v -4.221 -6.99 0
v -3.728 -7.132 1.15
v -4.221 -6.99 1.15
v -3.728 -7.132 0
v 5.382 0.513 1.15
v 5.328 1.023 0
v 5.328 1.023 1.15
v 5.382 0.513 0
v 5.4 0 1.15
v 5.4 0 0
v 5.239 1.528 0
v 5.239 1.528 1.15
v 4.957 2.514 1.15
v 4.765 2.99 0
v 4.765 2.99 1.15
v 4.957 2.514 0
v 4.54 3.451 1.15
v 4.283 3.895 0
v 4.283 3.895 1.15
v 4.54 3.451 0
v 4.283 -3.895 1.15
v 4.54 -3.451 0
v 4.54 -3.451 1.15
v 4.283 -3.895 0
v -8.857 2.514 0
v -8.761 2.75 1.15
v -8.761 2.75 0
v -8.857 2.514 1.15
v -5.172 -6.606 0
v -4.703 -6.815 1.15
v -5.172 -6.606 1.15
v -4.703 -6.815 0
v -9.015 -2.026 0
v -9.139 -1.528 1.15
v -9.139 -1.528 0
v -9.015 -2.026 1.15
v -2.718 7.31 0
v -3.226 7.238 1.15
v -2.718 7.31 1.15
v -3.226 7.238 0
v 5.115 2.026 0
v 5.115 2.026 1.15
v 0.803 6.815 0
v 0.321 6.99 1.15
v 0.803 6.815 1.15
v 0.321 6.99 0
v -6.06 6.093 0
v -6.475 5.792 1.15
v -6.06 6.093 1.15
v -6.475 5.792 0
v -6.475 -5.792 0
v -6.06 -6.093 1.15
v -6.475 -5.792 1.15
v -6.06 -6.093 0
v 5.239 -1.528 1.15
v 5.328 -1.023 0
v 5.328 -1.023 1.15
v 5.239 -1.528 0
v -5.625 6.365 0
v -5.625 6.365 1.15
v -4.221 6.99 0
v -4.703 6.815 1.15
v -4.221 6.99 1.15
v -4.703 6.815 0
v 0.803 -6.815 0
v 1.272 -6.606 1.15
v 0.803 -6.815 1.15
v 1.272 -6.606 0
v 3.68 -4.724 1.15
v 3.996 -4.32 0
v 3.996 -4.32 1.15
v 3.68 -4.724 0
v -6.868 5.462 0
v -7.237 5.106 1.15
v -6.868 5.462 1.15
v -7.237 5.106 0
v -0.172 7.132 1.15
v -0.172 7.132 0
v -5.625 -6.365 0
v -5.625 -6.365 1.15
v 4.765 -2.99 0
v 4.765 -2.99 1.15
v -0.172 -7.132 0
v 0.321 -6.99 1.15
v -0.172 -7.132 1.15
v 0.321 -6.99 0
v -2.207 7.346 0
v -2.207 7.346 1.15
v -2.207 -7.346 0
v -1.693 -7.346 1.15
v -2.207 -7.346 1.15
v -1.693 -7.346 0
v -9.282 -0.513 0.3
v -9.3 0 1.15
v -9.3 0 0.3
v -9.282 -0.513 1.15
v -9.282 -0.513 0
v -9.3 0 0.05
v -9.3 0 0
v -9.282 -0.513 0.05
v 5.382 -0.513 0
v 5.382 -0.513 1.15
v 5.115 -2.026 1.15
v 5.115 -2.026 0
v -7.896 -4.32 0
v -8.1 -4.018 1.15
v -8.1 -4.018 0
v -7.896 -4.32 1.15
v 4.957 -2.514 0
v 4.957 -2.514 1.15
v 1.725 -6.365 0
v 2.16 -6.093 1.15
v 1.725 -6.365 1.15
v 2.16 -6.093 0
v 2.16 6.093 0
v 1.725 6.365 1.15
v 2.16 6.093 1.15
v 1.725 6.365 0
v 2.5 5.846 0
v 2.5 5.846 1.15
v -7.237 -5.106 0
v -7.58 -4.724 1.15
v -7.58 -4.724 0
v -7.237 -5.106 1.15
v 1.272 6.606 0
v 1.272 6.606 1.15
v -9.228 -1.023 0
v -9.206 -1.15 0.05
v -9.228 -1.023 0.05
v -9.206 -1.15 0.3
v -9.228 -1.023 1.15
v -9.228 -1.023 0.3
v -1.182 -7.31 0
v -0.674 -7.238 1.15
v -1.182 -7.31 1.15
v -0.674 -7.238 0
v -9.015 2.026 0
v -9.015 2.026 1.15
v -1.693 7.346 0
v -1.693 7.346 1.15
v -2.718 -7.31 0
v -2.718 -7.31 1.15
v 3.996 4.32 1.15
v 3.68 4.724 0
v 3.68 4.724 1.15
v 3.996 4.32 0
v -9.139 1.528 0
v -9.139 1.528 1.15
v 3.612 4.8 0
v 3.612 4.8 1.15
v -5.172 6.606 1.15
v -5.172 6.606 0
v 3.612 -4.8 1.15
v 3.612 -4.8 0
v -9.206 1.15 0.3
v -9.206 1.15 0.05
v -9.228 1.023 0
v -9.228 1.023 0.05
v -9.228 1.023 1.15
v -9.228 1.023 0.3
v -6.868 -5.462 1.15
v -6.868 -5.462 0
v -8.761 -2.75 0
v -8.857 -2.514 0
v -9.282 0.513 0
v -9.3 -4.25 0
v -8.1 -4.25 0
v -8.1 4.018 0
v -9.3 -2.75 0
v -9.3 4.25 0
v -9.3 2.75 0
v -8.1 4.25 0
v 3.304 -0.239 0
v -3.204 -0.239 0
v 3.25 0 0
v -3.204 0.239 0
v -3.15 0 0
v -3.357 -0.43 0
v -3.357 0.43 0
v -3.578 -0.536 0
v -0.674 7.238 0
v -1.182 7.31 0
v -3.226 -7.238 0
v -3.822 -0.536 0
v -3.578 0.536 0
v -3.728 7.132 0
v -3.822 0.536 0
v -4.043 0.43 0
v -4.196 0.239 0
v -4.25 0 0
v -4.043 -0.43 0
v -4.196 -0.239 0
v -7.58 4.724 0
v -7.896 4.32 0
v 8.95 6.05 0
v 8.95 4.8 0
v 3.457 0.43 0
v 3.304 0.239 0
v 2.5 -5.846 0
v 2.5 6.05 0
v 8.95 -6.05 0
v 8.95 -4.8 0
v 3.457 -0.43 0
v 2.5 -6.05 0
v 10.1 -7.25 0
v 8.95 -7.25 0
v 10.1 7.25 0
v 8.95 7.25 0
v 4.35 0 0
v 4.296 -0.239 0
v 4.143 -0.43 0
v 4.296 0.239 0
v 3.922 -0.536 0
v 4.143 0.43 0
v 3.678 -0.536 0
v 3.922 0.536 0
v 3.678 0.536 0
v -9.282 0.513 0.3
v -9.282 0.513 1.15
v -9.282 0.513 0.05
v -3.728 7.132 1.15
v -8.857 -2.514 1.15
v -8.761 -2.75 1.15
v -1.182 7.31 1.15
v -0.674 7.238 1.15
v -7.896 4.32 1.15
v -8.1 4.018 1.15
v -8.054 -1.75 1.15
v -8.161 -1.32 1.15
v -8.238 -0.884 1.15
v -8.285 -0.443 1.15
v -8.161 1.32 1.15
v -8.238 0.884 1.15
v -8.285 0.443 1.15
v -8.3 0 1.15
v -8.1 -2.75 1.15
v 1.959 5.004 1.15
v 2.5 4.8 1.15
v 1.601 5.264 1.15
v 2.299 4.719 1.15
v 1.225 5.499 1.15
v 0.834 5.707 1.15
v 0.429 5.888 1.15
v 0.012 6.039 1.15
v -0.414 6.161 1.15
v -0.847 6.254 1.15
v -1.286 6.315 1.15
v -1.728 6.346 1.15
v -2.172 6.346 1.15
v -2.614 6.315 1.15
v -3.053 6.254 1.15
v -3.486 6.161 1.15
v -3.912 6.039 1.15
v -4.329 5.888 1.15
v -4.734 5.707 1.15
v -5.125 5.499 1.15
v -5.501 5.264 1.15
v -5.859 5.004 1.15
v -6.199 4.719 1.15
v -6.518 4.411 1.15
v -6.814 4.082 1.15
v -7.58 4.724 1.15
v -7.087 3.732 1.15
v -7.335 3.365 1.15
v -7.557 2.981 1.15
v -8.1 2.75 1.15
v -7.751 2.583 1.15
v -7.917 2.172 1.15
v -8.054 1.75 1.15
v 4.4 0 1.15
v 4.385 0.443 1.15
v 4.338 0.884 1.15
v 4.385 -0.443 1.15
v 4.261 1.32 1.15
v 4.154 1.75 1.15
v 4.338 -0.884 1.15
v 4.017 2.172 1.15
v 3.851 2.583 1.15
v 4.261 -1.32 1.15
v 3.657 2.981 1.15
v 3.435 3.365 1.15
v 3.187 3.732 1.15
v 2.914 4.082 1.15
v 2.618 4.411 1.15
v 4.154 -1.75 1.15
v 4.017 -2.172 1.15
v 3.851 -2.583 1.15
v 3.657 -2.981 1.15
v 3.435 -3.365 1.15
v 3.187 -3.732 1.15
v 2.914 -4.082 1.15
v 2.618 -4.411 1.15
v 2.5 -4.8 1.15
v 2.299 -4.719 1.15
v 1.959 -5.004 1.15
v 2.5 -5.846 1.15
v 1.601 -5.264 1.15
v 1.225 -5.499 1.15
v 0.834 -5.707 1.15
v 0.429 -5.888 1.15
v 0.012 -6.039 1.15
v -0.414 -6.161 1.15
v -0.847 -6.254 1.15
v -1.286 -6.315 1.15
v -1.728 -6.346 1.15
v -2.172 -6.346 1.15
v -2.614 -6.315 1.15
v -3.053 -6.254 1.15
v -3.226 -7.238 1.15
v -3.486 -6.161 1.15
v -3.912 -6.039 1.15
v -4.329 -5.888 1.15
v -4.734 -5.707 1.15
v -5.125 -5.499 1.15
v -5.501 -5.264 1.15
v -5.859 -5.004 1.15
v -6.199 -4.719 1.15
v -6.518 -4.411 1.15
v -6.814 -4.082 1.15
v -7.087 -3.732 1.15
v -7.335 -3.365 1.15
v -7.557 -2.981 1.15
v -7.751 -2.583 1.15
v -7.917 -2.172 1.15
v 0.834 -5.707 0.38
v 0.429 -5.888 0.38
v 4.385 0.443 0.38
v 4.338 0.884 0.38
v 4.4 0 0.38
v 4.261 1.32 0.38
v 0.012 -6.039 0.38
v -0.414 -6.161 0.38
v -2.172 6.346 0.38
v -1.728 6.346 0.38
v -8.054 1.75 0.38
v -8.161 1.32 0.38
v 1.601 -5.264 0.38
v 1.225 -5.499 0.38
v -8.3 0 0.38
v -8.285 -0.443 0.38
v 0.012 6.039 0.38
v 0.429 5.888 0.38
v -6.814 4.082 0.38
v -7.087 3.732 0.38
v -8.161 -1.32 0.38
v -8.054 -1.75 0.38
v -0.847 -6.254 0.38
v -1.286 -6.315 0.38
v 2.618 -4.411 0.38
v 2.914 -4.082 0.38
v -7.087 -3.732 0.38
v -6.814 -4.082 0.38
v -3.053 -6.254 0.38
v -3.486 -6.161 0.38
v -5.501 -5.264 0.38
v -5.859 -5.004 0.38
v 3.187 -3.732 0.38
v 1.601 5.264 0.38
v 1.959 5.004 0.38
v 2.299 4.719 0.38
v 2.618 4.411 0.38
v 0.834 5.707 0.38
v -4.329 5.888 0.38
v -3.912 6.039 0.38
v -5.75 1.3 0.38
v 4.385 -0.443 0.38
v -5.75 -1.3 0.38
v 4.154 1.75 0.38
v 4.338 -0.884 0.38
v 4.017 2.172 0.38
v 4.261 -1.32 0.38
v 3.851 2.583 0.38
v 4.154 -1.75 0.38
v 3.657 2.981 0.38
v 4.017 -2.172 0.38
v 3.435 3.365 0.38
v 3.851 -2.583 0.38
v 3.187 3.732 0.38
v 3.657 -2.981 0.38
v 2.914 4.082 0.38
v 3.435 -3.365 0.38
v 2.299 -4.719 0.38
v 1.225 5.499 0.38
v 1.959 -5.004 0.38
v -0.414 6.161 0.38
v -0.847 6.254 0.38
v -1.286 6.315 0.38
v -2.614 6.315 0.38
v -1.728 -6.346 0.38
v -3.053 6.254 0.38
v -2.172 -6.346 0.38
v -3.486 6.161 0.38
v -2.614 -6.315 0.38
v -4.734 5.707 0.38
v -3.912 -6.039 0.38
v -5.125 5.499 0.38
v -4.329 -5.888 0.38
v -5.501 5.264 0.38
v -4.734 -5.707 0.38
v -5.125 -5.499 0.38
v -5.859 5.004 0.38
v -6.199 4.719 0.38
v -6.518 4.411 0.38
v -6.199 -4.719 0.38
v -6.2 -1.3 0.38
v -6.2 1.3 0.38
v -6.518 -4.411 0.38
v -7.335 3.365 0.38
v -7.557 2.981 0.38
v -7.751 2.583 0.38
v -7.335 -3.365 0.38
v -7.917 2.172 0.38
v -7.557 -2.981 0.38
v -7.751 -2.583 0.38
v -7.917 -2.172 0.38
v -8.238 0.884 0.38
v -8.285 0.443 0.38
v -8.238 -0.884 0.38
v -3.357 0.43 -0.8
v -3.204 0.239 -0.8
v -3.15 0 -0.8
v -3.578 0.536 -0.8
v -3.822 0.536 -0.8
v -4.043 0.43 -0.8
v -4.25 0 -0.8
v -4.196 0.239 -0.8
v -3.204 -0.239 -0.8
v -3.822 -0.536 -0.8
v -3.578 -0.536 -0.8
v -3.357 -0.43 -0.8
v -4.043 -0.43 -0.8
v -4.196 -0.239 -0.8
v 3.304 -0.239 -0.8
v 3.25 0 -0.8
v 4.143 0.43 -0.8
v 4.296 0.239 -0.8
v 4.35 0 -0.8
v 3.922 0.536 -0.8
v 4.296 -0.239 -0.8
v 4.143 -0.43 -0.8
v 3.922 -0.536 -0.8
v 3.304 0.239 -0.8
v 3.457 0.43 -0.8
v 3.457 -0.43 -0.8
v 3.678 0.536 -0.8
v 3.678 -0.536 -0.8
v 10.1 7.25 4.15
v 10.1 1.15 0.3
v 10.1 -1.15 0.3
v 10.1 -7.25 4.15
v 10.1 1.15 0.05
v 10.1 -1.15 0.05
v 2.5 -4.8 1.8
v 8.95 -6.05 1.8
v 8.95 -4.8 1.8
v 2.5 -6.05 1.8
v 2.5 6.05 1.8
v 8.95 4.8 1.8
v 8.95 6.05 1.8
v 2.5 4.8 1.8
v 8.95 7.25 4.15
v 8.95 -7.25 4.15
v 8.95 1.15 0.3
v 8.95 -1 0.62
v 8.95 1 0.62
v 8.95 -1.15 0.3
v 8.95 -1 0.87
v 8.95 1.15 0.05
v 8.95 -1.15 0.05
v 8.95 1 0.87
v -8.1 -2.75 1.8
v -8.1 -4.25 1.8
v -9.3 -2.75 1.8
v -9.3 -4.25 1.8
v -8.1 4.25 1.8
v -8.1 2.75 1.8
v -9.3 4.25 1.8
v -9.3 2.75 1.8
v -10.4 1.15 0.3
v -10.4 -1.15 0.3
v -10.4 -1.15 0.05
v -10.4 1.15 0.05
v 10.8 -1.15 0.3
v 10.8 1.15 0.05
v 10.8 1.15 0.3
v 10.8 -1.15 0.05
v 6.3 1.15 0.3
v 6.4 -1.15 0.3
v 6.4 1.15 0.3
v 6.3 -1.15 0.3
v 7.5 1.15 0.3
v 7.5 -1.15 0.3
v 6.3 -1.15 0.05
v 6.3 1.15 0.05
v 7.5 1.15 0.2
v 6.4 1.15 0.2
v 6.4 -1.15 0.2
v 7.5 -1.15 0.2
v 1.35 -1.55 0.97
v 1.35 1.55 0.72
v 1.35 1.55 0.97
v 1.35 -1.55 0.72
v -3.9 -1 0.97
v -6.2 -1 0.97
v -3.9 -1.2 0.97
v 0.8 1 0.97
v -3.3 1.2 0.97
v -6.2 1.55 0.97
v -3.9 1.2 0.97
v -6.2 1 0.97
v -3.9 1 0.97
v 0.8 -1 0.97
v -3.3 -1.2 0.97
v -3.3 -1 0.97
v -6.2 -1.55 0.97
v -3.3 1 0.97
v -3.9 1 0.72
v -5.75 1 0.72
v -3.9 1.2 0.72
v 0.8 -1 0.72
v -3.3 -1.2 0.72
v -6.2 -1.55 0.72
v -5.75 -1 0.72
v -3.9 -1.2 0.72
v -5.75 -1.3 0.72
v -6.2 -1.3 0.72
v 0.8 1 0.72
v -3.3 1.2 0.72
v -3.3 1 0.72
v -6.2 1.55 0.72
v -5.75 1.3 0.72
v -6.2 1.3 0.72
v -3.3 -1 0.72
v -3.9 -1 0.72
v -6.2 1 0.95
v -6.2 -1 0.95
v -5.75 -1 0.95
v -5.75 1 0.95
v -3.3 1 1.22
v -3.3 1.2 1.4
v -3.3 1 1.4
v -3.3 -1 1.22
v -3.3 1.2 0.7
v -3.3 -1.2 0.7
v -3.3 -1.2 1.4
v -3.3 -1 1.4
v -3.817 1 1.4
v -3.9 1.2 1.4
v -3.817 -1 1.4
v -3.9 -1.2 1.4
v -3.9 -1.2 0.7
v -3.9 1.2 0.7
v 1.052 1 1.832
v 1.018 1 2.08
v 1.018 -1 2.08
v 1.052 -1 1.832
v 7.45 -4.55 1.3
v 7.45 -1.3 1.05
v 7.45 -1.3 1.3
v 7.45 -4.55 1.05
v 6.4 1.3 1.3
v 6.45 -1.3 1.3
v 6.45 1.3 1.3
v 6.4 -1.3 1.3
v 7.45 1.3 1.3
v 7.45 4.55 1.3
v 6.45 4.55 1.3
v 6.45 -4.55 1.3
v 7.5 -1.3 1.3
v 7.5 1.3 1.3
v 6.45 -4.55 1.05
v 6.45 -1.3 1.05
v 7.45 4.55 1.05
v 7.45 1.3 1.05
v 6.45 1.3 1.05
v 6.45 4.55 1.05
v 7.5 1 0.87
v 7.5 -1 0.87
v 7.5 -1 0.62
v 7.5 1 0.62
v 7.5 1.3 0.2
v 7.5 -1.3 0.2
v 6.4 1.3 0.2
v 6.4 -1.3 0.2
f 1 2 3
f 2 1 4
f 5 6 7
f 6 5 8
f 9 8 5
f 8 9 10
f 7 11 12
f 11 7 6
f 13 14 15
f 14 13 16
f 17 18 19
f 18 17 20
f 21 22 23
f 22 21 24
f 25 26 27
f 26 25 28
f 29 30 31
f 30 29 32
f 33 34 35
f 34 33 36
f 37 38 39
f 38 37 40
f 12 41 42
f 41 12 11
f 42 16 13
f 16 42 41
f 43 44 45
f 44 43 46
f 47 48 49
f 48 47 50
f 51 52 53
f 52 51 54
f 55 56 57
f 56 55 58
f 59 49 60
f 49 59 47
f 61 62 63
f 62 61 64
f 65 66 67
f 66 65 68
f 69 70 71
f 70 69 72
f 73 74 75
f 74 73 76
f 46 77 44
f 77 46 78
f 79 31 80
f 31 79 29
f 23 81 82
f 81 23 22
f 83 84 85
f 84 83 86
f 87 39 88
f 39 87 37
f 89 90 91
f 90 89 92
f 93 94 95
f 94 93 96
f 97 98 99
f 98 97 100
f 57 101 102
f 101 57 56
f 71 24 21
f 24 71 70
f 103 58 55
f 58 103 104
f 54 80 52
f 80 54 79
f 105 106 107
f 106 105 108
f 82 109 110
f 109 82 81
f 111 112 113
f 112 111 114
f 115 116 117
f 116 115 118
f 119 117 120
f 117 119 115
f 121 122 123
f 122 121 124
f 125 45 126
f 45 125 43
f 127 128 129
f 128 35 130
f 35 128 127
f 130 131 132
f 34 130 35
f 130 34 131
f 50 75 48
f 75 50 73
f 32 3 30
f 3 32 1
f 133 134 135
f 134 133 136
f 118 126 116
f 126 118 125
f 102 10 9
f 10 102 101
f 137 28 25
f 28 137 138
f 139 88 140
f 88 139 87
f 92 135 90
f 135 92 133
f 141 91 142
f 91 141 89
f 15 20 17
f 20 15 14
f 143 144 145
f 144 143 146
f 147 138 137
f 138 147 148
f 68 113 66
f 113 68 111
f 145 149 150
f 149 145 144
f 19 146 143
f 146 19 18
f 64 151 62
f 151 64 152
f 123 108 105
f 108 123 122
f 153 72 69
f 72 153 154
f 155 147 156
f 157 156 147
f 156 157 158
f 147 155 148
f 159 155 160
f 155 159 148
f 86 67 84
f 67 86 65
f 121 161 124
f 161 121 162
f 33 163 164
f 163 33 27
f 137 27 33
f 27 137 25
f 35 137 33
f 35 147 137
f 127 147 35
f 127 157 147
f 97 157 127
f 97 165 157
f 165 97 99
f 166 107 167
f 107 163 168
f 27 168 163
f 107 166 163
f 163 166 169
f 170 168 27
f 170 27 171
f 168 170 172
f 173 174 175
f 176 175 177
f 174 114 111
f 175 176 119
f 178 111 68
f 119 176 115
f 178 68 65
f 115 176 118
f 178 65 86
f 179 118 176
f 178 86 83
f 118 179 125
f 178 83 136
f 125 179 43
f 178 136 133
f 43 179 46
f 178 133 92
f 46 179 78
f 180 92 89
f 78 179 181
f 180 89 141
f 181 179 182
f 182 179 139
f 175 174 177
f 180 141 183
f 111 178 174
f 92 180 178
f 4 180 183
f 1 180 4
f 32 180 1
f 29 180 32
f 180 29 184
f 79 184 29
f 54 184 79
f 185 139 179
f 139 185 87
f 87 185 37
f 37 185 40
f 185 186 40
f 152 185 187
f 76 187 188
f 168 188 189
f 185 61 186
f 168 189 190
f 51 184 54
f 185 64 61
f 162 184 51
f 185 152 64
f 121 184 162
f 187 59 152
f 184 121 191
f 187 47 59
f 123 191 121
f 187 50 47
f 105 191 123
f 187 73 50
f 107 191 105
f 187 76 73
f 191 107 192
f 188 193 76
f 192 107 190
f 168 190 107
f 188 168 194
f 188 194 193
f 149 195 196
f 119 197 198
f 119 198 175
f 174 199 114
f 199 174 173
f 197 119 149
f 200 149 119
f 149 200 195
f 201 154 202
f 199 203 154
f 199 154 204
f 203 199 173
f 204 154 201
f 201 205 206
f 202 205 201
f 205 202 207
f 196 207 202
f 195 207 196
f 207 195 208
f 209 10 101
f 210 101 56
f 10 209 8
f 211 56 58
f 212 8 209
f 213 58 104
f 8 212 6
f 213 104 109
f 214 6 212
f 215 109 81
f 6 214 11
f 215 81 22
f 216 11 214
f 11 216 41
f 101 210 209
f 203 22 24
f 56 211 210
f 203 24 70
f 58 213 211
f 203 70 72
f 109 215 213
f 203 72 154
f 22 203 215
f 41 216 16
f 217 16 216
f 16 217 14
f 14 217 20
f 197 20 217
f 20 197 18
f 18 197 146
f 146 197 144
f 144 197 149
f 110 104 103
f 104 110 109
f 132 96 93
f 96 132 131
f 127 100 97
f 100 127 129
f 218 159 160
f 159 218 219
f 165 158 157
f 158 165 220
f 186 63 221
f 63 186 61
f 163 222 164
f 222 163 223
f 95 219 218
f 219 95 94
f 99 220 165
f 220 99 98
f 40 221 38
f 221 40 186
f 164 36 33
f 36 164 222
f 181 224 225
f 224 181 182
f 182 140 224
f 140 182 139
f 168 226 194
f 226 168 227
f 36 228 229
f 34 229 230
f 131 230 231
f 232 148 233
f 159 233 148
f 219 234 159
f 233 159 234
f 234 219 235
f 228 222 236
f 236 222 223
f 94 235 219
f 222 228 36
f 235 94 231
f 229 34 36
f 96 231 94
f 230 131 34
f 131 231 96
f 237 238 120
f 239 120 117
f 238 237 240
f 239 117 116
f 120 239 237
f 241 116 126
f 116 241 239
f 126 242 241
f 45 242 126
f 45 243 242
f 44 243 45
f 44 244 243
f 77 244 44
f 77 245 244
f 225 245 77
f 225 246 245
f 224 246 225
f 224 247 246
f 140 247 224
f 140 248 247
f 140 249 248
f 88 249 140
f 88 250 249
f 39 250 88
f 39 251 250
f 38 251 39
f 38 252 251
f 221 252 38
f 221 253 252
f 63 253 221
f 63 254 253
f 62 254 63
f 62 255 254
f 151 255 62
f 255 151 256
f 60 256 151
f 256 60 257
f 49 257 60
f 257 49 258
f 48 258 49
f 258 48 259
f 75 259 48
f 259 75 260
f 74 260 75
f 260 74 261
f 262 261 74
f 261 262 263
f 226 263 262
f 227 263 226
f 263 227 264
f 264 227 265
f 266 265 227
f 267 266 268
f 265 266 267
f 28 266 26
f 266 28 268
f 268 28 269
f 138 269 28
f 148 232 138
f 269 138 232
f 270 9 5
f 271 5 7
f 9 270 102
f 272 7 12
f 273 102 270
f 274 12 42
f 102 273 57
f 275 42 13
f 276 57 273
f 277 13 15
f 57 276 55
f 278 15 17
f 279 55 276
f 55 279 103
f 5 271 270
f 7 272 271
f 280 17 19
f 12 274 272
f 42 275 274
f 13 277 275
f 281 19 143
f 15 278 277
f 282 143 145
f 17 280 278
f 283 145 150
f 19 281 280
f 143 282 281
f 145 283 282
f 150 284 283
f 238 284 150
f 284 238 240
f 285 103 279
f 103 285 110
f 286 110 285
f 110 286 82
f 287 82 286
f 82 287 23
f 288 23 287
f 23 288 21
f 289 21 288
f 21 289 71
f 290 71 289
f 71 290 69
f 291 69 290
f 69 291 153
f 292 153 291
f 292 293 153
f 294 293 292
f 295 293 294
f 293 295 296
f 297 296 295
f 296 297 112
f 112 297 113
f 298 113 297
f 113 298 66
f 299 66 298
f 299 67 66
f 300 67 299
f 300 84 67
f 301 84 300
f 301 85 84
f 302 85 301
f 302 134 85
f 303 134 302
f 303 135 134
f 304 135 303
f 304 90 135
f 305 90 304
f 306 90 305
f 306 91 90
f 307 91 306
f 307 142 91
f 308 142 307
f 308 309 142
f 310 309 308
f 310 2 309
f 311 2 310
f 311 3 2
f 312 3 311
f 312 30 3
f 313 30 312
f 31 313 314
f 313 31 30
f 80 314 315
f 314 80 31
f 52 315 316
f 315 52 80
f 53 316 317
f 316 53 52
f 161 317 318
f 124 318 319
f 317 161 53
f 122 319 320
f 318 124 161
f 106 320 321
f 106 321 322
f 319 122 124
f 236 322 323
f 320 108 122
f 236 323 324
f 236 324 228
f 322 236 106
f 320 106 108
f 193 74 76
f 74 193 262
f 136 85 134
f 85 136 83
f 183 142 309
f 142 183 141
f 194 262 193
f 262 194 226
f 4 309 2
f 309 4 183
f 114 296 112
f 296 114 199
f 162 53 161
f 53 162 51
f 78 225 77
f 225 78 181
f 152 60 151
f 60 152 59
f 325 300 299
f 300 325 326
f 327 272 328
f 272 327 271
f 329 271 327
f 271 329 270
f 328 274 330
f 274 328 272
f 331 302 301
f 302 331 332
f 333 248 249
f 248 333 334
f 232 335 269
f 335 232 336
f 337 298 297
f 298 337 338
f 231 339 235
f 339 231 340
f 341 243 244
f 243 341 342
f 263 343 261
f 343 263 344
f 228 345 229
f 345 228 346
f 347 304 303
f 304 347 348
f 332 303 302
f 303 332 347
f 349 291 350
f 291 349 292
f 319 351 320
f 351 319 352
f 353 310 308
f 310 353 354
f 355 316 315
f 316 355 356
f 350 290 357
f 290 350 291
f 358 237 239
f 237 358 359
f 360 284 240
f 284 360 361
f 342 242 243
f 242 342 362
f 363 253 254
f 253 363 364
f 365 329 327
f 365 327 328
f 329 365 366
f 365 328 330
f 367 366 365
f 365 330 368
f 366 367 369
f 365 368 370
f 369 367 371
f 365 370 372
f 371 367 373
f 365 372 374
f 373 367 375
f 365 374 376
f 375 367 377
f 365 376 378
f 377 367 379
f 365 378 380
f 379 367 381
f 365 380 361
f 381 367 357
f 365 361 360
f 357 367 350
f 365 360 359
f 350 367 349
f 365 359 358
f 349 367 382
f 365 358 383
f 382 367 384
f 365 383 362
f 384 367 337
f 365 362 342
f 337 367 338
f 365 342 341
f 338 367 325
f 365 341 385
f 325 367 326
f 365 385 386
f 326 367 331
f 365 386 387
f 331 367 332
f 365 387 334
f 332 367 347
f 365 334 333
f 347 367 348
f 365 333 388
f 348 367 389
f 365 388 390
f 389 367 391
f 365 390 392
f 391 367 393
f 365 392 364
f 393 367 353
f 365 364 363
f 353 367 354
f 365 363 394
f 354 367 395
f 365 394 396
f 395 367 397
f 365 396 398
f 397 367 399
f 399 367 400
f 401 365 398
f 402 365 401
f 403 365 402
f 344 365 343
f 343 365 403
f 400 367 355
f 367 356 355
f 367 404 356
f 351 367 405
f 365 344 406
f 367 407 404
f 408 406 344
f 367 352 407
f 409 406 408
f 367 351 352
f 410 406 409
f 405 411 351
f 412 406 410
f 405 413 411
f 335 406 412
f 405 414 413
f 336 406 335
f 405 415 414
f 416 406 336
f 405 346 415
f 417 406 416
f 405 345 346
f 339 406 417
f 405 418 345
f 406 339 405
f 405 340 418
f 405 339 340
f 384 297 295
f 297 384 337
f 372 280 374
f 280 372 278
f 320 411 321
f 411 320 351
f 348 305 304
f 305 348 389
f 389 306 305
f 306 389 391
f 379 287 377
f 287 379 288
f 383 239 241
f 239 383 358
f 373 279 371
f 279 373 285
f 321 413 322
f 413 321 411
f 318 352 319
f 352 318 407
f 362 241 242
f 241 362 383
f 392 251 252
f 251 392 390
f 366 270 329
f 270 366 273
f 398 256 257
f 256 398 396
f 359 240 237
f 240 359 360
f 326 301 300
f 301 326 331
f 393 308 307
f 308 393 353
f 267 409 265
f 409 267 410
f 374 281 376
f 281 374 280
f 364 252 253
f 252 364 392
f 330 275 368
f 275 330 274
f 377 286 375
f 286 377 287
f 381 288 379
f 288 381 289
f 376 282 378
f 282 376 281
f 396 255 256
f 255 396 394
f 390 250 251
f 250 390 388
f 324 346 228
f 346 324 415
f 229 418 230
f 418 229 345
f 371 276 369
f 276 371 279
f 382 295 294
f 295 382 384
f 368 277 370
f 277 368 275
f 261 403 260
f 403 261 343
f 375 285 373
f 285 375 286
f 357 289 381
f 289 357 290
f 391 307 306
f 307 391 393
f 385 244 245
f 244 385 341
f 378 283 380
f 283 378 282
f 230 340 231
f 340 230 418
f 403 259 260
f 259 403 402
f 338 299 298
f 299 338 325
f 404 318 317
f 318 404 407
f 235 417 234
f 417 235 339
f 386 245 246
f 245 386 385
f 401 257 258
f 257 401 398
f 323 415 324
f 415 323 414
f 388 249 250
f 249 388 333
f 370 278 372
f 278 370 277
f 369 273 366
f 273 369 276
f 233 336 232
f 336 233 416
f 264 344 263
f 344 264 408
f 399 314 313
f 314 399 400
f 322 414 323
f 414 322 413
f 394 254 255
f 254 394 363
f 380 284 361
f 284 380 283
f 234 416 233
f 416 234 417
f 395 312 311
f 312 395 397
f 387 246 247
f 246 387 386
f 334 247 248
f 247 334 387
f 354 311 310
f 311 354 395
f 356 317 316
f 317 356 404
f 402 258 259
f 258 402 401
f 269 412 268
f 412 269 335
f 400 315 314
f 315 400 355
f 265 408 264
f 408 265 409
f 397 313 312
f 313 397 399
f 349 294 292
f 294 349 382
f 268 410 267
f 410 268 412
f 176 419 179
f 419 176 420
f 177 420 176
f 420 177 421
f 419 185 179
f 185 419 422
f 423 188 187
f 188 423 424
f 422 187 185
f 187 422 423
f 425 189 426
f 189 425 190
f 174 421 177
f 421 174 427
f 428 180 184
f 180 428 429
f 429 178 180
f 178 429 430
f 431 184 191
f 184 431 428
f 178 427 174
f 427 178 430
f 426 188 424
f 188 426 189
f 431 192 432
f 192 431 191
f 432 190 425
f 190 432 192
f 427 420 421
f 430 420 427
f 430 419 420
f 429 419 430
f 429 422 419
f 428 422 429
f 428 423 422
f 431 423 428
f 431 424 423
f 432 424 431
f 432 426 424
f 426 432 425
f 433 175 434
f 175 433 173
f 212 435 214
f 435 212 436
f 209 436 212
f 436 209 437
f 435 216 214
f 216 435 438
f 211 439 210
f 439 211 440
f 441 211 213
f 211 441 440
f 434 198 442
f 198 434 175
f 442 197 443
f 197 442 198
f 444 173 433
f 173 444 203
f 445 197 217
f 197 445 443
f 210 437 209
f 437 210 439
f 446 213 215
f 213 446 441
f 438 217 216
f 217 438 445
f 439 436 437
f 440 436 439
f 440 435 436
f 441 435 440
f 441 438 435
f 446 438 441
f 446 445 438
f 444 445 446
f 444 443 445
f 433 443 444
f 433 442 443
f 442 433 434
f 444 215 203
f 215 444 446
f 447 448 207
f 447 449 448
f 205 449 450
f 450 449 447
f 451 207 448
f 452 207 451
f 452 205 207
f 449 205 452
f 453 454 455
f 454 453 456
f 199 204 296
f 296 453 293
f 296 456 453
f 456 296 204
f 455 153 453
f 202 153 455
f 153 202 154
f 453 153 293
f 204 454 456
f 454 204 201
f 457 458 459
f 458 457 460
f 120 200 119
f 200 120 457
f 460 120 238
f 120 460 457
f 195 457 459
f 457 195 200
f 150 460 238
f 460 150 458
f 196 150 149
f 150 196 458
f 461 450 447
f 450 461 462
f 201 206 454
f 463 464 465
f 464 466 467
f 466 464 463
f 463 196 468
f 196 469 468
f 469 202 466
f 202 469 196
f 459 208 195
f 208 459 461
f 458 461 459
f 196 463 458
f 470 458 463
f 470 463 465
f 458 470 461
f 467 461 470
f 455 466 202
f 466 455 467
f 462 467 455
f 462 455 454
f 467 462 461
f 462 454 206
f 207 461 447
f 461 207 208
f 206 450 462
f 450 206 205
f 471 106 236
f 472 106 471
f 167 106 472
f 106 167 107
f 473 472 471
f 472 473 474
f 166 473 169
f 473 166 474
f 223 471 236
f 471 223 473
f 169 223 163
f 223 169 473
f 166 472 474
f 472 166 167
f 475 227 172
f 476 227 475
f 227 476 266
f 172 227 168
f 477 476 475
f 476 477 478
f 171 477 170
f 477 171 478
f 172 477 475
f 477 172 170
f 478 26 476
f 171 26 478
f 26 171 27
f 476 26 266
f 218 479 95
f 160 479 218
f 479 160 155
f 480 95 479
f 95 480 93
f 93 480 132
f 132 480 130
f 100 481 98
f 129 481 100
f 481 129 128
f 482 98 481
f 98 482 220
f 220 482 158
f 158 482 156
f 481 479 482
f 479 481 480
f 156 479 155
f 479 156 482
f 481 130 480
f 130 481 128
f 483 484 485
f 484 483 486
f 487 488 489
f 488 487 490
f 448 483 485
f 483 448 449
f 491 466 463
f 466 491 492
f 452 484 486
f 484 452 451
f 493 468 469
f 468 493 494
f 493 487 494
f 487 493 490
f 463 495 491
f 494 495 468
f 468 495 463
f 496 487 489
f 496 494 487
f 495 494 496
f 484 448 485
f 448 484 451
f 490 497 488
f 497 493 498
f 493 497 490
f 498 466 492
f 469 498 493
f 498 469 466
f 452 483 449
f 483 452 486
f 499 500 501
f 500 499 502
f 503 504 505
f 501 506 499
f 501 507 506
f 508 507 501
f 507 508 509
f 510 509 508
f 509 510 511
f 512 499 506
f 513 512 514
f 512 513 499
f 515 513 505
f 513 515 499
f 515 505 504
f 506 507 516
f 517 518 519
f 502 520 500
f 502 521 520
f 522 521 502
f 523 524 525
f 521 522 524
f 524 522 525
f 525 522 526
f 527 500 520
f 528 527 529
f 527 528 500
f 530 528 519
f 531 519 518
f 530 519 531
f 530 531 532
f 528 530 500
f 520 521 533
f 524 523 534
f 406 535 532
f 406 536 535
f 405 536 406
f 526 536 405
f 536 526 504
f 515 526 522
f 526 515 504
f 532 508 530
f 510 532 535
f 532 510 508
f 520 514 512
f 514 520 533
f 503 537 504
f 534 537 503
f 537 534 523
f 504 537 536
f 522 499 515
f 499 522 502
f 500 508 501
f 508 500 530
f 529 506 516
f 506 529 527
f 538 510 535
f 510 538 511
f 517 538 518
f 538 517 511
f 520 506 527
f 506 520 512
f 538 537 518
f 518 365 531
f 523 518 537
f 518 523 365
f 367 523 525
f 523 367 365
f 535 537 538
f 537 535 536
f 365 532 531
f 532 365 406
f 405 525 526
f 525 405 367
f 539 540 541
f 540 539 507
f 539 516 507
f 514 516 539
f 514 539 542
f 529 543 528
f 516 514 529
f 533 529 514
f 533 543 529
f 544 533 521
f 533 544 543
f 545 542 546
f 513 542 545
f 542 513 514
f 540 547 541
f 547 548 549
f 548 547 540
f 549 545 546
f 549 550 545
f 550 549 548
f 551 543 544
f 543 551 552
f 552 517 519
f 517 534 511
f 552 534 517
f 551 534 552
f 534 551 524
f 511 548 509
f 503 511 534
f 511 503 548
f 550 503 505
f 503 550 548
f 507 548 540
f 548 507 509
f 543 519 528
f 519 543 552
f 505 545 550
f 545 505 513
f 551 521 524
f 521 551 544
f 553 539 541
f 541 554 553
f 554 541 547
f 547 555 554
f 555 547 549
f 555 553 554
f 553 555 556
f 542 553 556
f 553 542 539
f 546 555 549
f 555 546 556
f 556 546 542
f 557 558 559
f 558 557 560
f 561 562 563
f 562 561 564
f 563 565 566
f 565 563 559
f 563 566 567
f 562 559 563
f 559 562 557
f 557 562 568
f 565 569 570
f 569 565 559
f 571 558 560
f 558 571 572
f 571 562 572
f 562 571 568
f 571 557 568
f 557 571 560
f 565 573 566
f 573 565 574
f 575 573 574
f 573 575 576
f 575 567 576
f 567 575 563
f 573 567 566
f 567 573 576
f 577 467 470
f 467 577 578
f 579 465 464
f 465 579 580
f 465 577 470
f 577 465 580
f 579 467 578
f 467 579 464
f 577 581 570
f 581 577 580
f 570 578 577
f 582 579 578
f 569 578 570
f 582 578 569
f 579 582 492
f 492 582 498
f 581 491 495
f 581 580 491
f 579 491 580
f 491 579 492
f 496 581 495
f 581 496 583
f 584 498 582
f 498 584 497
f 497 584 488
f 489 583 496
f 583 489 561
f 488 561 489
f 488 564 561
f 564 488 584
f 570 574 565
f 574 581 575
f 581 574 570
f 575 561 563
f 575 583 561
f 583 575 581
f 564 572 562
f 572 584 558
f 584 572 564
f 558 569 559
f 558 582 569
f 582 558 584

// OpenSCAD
/*
Lian Xin Technology XDCR-1220-006 CR1220 SMD holder.
Evidence: XDCR-1220-006/007 drawing, page 1, top/side/bottom views,
PCB Holes Diagram, material note, and BOM table (2023-12-25).

Coordinate contract: millimetres; footprint origin is midway between the two
locating-hole X coordinates; +X runs from terminal 1 toward terminal 2, +Y is
across the holder, and Z=0 is the PCB seating plane. The model extends upward
in +Z and locating posts extend below the plane. Terminal 1 is on -X.
*/

$fa = 4;
$fs = 0.25;
epsilon = 0.02;
render_part = "all";
projection_view = "3d";

outer_radius = 7.35;             // diameter 14.7 +/- 0.1
pocket_radius = 6.35;            // diameter 12.7 +/- 0.1
circle_center_x = -1.95;         // 9.3 from left datum to footprint origin
body_left_x = -9.30;
body_right_x = 10.10;            // nominal overall width 19.4
body_half_y = 7.25;              // nominal overall depth 14.5
body_height = 4.15;
base_height = 1.15;
wall_thickness = 1.15;

post_radius = 0.55;              // clearance inside two diameter-1.2 PCB holes
post_depth = 0.80;               // undocumented; fit-check assumption
post_x = [-3.70, 3.80];

terminal_width = 4.50;
terminal_depth = 2.30;
terminal_thickness = 0.25;       // undocumented sheet thickness assumption
terminal_centers_x = [-8.15, 8.55];

housing_color = [0.20, 0.075, 0.025]; // XDCR-1220-006 PPS brown/black-brown
gold_color = [0.83, 0.65, 0.16];      // datasheet: phosphor bronze, Au-plated

module housing() {
    union() {
        difference() {
            translate([circle_center_x, 0, 0])
                cylinder(r=outer_radius, h=base_height);
            translate([circle_center_x, 0, 0.38])
                cylinder(r=pocket_radius, h=base_height + epsilon);
        }

        // Raised insertion-side PPS guide and retaining wall from the side view.
        // These bridges overlap the circular body in XY; disconnected housing
        // volumes are a validation failure even if a top view looks adjacent.
        translate([2.50, -6.05, 0])
            cube([body_right_x - 2.50, 1.25, 1.80]);
        translate([2.50, 4.80, 0])
            cube([body_right_x - 2.50, 1.25, 1.80]);
        translate([body_right_x - wall_thickness, -body_half_y, 0])
            cube([wall_thickness, 2 * body_half_y, body_height]);

        // Small housing stops visible in the bottom view.
        translate([body_left_x, -4.25, 0]) cube([1.20, 1.50, 1.80]);
        translate([body_left_x, 2.75, 0]) cube([1.20, 1.50, 1.80]);

        for (x = post_x)
            // Extend into the base floor so the join is volumetric rather than
            // a coplanar face that a downstream CAD kernel may split.
            translate([x, 0, -post_depth])
                cylinder(r=post_radius, h=post_depth + 0.20);
    }
}

module contacts() {
    union() {
        // Manufacturer PCB land pattern: 4.5 x 2.3 mm terminals.
        for (x = terminal_centers_x)
            translate([x - terminal_width / 2, -terminal_depth / 2, 0.05])
                cube([terminal_width, terminal_depth, terminal_thickness]);

        // Terminal 1 folded spring contact, simplified from top and side views.
        translate([-6.20, -1.55, 0.72]) cube([7.55, 0.55, terminal_thickness]);
        translate([-6.20, 1.00, 0.72]) cube([7.55, 0.55, terminal_thickness]);
        translate([0.80, -1.00, 0.72]) cube([0.55, 2.00, terminal_thickness]);
        // Fold joins the exposed terminal-1 land to both spring rails. The
        // overlap is volumetric so the exported conductor is one solid.
        translate([-6.20, -1.30, 0.20]) cube([0.45, 2.60, 0.75]);
        translate([-3.90, -1.20, 0.70]) cube([0.60, 2.40, 0.70]);
        translate([-3.80, -1.00, 1.15])
            rotate([0, -8, 0]) cube([4.90, 2.00, terminal_thickness]);

        // Terminal 2 retaining/contact leaves along the insertion-side wall.
        translate([6.45, -4.55, 1.05]) cube([1.00, 3.55, terminal_thickness]);
        translate([6.45, 1.00, 1.05]) cube([1.00, 3.55, terminal_thickness]);
        translate([7.10, -1.00, 0.62]) cube([2.00, 2.00, terminal_thickness]);
        // Central fold joins the terminal-2 land, both retaining leaves, and
        // the contact bar into one conductor without approaching terminal 1.
        translate([6.40, -1.30, 0.20]) cube([1.10, 2.60, 1.10]);
    }
}

module selected_model() {
    if (render_part == "housing" || render_part == "all")
        color(housing_color) housing();
    if (render_part == "contacts" || render_part == "all")
        color(gold_color) contacts();
}

if (projection_view == "top")
    projection(cut=false) selected_model();
else if (projection_view == "front")
    projection(cut=false) rotate([90, 0, 0]) selected_model();
else if (projection_view == "side")
    projection(cut=false) rotate([90, 0, 90]) selected_model();
else
    selected_model();
